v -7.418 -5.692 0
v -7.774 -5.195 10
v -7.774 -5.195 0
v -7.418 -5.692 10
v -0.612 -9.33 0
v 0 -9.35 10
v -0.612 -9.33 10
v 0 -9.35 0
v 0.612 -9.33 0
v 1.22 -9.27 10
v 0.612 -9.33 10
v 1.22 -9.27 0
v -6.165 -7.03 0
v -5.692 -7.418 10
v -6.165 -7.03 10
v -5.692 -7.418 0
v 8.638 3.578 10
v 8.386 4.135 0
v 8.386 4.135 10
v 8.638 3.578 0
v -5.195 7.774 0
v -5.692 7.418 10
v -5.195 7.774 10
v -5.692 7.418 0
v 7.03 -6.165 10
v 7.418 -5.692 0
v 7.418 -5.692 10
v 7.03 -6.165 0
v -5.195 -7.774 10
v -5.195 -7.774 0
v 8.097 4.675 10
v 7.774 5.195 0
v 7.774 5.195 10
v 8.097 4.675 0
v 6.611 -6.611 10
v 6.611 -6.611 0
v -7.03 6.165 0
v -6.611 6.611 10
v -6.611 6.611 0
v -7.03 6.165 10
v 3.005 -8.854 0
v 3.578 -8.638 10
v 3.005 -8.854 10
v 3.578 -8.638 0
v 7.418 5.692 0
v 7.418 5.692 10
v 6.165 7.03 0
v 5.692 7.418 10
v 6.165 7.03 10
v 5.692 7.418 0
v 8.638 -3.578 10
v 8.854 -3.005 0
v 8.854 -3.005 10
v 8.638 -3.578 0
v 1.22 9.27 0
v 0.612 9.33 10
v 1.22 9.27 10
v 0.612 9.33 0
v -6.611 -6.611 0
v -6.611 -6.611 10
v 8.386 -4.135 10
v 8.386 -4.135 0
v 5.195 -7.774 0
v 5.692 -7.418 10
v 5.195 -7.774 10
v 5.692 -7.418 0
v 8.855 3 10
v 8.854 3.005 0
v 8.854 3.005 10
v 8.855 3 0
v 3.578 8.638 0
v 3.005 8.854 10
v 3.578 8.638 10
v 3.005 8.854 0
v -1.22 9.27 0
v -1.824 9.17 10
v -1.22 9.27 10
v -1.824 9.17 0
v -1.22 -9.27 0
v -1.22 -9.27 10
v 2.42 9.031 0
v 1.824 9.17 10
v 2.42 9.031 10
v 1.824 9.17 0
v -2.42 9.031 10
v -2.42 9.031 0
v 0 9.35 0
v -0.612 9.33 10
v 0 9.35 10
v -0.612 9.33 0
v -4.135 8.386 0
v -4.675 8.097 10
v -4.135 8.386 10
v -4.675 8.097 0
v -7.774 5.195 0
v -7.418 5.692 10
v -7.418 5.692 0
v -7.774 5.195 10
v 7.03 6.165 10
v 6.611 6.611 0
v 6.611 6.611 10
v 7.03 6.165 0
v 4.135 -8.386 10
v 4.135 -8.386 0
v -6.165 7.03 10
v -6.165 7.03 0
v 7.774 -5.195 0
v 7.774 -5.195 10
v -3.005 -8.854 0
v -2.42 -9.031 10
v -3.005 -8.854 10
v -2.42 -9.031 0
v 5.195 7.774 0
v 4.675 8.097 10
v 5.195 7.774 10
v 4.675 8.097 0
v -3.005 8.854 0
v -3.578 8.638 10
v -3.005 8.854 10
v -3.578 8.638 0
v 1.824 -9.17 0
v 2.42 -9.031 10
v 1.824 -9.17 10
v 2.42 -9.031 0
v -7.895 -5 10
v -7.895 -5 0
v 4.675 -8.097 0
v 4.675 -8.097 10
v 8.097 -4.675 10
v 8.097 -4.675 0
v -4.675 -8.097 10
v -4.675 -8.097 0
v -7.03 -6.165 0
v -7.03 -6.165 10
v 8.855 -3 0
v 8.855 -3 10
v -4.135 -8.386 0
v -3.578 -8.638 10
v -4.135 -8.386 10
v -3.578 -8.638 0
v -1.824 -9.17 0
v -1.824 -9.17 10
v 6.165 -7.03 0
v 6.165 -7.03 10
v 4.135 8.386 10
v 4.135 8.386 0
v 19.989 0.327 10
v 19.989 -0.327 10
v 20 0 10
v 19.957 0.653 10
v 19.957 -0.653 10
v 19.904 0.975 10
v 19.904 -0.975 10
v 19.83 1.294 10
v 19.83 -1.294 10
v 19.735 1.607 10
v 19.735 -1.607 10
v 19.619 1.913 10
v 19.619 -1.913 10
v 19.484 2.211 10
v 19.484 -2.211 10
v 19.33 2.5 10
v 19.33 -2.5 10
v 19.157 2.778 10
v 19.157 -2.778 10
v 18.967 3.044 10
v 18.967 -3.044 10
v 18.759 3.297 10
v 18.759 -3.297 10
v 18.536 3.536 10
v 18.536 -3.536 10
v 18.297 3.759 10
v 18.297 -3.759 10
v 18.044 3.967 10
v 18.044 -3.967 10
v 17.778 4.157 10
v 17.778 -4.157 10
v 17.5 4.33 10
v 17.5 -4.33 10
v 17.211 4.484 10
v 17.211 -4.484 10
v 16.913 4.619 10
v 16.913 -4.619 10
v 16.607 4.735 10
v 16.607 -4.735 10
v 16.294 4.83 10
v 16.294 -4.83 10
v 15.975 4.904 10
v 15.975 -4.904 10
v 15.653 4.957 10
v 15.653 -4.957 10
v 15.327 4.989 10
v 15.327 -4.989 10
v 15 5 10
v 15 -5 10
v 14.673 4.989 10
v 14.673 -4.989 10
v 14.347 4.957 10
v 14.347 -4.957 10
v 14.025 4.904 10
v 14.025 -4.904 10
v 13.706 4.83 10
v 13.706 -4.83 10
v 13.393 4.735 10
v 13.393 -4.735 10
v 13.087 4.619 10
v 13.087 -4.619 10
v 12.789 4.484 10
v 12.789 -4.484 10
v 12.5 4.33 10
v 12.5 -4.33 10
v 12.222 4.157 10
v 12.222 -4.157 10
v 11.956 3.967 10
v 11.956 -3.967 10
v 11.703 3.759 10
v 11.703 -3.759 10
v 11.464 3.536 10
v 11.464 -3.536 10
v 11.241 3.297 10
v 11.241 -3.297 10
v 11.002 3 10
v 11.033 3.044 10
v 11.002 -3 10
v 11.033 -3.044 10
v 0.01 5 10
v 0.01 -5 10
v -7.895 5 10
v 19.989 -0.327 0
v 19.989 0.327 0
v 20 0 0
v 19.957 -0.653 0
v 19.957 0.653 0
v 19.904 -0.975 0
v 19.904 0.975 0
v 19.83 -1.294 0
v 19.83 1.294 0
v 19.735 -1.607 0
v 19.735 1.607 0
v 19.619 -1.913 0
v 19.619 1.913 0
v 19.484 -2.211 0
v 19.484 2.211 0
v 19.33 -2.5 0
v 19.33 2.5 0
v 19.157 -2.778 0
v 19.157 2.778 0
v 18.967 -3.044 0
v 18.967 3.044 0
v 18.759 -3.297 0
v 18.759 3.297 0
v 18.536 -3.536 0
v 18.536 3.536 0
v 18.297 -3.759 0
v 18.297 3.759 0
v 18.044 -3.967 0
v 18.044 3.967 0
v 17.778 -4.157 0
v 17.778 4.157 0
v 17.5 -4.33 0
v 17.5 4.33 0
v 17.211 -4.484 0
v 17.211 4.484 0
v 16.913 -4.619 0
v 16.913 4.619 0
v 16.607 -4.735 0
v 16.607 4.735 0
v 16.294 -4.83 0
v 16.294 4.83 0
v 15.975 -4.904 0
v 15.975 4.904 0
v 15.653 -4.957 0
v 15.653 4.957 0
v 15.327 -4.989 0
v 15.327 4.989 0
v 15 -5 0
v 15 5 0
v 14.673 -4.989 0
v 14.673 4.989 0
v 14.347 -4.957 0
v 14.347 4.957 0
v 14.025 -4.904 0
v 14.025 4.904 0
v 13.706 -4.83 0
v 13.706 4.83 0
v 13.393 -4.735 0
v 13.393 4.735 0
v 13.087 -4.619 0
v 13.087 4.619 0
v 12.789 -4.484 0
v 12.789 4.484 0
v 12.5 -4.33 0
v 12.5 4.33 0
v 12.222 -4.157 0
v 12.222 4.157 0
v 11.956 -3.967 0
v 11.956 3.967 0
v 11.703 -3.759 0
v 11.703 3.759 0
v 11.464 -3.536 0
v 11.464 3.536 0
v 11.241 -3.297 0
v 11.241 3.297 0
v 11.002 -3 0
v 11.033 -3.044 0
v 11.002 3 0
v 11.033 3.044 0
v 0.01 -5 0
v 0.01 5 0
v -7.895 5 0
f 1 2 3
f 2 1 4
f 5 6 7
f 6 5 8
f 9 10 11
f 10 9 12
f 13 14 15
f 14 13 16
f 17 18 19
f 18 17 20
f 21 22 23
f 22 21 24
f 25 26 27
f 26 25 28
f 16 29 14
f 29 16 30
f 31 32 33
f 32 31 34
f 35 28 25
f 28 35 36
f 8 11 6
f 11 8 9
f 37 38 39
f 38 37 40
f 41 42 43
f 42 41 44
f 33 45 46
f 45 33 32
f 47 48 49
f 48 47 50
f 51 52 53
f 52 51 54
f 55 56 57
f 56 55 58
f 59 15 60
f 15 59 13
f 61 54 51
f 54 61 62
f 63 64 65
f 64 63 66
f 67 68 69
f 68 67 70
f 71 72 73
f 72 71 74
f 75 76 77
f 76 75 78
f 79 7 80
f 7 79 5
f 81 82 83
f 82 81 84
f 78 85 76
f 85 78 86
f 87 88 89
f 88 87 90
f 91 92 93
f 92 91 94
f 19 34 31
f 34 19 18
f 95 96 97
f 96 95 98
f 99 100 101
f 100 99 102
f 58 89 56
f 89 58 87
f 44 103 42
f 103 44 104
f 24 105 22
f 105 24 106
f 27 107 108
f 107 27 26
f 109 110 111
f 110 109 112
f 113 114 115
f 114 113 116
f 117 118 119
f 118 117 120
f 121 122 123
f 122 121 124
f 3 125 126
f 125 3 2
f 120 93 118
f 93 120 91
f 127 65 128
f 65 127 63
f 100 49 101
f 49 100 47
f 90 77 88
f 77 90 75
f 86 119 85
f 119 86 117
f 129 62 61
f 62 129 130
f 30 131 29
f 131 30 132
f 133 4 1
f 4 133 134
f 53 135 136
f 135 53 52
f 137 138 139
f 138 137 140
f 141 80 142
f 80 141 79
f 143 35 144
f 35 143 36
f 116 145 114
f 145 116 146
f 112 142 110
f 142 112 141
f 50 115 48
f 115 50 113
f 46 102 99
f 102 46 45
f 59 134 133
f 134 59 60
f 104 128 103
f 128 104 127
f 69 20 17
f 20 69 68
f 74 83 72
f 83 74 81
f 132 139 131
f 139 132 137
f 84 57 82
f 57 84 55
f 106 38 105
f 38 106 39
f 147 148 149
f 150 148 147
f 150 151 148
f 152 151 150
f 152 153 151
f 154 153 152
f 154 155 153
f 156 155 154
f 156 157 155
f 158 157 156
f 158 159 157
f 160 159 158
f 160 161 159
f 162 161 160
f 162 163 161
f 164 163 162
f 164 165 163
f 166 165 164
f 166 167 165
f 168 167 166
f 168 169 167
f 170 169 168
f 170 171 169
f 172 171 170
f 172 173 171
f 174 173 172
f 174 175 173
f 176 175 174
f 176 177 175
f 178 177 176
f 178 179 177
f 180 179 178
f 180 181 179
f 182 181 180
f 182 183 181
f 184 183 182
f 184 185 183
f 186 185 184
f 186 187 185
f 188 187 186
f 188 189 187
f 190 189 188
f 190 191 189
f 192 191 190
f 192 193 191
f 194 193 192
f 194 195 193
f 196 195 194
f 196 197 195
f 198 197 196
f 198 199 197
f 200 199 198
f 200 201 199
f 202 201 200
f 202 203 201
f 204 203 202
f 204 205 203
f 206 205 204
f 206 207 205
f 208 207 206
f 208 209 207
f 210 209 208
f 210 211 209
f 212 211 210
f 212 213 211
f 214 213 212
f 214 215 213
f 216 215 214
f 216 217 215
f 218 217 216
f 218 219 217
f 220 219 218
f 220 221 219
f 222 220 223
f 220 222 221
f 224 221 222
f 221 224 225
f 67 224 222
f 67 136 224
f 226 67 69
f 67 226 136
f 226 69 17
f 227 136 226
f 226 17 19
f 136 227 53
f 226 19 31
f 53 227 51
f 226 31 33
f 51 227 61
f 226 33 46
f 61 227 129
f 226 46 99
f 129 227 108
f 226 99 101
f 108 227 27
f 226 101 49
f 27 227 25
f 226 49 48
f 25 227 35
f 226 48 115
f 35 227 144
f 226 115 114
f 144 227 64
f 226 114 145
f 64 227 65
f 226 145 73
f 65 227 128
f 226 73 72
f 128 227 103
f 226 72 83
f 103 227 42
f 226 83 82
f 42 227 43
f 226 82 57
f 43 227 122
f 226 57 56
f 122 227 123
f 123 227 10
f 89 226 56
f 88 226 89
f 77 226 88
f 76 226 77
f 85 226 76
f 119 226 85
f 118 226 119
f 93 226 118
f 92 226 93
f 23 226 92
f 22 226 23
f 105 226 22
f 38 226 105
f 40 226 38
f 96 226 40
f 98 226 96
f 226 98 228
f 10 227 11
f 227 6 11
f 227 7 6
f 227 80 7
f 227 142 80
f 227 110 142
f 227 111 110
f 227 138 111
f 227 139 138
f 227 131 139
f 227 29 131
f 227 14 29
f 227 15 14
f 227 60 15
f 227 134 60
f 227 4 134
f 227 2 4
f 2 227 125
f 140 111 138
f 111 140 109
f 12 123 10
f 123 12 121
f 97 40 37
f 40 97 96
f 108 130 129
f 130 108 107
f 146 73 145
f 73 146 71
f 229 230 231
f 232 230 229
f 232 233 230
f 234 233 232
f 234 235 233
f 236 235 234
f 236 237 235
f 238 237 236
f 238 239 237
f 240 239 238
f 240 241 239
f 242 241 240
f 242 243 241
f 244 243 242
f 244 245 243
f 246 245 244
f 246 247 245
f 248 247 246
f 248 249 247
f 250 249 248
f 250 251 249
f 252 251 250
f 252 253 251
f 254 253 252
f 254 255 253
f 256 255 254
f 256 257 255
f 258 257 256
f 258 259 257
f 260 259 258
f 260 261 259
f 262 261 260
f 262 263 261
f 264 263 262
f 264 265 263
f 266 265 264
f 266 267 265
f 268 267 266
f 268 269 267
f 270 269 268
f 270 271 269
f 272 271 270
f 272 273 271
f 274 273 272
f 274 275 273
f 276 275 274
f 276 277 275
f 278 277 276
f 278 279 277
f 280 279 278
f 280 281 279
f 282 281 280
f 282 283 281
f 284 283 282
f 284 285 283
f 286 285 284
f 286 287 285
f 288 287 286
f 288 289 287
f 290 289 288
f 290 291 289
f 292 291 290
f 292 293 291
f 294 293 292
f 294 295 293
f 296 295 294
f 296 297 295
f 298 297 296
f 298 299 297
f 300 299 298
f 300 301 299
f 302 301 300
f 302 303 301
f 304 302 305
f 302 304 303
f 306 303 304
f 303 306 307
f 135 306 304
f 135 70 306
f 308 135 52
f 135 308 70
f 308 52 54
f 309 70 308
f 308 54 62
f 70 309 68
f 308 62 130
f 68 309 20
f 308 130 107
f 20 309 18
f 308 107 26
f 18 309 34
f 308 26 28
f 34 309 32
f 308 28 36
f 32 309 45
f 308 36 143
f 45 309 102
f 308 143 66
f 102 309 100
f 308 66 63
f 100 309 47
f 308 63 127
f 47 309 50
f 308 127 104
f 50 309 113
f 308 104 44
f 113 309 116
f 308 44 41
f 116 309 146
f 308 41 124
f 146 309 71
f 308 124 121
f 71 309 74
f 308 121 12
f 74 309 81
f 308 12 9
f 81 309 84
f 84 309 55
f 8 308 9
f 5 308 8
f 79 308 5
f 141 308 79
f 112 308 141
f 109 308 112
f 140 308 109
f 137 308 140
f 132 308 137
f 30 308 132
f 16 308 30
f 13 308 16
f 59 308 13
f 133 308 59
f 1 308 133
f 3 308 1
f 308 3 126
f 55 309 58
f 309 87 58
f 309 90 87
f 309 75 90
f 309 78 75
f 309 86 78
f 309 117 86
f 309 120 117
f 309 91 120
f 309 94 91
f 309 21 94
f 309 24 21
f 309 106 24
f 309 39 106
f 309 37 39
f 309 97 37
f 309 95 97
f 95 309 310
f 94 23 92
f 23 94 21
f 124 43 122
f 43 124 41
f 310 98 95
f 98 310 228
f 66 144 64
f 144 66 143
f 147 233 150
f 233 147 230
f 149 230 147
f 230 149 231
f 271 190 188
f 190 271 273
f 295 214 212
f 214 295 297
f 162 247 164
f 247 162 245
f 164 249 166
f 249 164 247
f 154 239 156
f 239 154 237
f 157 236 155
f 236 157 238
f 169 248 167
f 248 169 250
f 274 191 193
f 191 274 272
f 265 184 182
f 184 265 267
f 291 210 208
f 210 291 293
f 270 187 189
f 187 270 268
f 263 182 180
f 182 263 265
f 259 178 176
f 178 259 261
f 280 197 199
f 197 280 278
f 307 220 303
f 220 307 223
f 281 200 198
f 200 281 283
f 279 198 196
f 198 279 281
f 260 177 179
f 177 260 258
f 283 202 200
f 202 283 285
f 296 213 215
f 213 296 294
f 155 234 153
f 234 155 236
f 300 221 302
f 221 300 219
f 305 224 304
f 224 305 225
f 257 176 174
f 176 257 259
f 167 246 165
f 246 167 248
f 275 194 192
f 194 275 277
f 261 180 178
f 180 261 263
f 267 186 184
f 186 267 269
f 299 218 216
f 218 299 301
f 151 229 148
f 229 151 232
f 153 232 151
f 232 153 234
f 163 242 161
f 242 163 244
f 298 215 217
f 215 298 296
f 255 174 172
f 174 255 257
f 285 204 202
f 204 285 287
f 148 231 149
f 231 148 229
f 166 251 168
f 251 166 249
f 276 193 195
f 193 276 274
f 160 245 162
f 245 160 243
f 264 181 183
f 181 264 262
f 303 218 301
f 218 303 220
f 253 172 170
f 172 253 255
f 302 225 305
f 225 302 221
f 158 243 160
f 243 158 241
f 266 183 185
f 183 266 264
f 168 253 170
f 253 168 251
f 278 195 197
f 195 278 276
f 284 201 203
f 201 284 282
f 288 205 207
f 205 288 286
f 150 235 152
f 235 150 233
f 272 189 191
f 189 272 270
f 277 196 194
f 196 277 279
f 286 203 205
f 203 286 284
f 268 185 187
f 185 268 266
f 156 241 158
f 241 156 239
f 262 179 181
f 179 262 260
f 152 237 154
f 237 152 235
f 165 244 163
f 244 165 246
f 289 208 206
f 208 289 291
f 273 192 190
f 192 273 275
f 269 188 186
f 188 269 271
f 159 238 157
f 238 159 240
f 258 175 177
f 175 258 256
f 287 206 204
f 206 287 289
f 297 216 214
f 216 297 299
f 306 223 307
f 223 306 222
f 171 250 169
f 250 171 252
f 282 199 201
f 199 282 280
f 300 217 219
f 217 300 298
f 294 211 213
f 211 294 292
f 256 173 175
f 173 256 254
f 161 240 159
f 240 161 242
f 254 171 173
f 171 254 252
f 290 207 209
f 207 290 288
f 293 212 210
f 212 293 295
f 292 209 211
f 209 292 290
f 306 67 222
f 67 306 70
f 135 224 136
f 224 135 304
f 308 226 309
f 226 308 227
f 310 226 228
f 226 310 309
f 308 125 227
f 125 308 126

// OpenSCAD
// Tubing/stand rod snap-on clip
// Print orientation: flat on bed, z = 0 up to z = 10

$fn = 96;

// ---- Dimensions (mm) ----
stand_d      = 12.7;   // stand rod diameter
stand_wall   = 3;      // stand ring wall thickness
stand_open   = 10;     // stand ring opening width (y)
stand_r      = stand_d/2 + stand_wall; // stand ring outer radius = 9.35

tubing_d     = 6;      // tubing inner diameter
tubing_wall  = 2;      // tubing ring wall thickness
tubing_x     = 15;     // tubing ring centre x
tubing_open  = 4.5;    // tubing ring opening width (y)
tubing_r     = tubing_d/2 + tubing_wall; // tubing ring outer radius = 5

bridge_w     = 6;      // bridge width (Y)
bridge_x0    = 8;      // bridge start (X)
bridge_x1    = 12;     // bridge end (X)

eps          = 0.5;    // cutter overshoot

// ---- Model ----
difference() {
    union() {
        // Stand ring
        cylinder(r = stand_r, h = 10);
        // Tubing ring
        translate([tubing_x, 0, 0])
            cylinder(r = tubing_r, h = 10);
        // Bridge
        translate([bridge_x0, -bridge_w/2, 0])
            cube([bridge_x1 - bridge_x0, bridge_w, 10]);
    }
    // Stand opening (x < 0, -5 < y < 5)
    translate([-stand_r - eps, -stand_open/2, -eps])
        cube([stand_r + eps + 0.01, stand_open, 10 + 2*eps]);
    // Tubing opening (x > 15, -2.25 < y < 2.25)
    translate([tubing_x + tubing_r + eps, -tubing_open/2, -eps])
        cube([tubing_r + eps + 0.01, tubing_open, 10 + 2*eps]);
}
